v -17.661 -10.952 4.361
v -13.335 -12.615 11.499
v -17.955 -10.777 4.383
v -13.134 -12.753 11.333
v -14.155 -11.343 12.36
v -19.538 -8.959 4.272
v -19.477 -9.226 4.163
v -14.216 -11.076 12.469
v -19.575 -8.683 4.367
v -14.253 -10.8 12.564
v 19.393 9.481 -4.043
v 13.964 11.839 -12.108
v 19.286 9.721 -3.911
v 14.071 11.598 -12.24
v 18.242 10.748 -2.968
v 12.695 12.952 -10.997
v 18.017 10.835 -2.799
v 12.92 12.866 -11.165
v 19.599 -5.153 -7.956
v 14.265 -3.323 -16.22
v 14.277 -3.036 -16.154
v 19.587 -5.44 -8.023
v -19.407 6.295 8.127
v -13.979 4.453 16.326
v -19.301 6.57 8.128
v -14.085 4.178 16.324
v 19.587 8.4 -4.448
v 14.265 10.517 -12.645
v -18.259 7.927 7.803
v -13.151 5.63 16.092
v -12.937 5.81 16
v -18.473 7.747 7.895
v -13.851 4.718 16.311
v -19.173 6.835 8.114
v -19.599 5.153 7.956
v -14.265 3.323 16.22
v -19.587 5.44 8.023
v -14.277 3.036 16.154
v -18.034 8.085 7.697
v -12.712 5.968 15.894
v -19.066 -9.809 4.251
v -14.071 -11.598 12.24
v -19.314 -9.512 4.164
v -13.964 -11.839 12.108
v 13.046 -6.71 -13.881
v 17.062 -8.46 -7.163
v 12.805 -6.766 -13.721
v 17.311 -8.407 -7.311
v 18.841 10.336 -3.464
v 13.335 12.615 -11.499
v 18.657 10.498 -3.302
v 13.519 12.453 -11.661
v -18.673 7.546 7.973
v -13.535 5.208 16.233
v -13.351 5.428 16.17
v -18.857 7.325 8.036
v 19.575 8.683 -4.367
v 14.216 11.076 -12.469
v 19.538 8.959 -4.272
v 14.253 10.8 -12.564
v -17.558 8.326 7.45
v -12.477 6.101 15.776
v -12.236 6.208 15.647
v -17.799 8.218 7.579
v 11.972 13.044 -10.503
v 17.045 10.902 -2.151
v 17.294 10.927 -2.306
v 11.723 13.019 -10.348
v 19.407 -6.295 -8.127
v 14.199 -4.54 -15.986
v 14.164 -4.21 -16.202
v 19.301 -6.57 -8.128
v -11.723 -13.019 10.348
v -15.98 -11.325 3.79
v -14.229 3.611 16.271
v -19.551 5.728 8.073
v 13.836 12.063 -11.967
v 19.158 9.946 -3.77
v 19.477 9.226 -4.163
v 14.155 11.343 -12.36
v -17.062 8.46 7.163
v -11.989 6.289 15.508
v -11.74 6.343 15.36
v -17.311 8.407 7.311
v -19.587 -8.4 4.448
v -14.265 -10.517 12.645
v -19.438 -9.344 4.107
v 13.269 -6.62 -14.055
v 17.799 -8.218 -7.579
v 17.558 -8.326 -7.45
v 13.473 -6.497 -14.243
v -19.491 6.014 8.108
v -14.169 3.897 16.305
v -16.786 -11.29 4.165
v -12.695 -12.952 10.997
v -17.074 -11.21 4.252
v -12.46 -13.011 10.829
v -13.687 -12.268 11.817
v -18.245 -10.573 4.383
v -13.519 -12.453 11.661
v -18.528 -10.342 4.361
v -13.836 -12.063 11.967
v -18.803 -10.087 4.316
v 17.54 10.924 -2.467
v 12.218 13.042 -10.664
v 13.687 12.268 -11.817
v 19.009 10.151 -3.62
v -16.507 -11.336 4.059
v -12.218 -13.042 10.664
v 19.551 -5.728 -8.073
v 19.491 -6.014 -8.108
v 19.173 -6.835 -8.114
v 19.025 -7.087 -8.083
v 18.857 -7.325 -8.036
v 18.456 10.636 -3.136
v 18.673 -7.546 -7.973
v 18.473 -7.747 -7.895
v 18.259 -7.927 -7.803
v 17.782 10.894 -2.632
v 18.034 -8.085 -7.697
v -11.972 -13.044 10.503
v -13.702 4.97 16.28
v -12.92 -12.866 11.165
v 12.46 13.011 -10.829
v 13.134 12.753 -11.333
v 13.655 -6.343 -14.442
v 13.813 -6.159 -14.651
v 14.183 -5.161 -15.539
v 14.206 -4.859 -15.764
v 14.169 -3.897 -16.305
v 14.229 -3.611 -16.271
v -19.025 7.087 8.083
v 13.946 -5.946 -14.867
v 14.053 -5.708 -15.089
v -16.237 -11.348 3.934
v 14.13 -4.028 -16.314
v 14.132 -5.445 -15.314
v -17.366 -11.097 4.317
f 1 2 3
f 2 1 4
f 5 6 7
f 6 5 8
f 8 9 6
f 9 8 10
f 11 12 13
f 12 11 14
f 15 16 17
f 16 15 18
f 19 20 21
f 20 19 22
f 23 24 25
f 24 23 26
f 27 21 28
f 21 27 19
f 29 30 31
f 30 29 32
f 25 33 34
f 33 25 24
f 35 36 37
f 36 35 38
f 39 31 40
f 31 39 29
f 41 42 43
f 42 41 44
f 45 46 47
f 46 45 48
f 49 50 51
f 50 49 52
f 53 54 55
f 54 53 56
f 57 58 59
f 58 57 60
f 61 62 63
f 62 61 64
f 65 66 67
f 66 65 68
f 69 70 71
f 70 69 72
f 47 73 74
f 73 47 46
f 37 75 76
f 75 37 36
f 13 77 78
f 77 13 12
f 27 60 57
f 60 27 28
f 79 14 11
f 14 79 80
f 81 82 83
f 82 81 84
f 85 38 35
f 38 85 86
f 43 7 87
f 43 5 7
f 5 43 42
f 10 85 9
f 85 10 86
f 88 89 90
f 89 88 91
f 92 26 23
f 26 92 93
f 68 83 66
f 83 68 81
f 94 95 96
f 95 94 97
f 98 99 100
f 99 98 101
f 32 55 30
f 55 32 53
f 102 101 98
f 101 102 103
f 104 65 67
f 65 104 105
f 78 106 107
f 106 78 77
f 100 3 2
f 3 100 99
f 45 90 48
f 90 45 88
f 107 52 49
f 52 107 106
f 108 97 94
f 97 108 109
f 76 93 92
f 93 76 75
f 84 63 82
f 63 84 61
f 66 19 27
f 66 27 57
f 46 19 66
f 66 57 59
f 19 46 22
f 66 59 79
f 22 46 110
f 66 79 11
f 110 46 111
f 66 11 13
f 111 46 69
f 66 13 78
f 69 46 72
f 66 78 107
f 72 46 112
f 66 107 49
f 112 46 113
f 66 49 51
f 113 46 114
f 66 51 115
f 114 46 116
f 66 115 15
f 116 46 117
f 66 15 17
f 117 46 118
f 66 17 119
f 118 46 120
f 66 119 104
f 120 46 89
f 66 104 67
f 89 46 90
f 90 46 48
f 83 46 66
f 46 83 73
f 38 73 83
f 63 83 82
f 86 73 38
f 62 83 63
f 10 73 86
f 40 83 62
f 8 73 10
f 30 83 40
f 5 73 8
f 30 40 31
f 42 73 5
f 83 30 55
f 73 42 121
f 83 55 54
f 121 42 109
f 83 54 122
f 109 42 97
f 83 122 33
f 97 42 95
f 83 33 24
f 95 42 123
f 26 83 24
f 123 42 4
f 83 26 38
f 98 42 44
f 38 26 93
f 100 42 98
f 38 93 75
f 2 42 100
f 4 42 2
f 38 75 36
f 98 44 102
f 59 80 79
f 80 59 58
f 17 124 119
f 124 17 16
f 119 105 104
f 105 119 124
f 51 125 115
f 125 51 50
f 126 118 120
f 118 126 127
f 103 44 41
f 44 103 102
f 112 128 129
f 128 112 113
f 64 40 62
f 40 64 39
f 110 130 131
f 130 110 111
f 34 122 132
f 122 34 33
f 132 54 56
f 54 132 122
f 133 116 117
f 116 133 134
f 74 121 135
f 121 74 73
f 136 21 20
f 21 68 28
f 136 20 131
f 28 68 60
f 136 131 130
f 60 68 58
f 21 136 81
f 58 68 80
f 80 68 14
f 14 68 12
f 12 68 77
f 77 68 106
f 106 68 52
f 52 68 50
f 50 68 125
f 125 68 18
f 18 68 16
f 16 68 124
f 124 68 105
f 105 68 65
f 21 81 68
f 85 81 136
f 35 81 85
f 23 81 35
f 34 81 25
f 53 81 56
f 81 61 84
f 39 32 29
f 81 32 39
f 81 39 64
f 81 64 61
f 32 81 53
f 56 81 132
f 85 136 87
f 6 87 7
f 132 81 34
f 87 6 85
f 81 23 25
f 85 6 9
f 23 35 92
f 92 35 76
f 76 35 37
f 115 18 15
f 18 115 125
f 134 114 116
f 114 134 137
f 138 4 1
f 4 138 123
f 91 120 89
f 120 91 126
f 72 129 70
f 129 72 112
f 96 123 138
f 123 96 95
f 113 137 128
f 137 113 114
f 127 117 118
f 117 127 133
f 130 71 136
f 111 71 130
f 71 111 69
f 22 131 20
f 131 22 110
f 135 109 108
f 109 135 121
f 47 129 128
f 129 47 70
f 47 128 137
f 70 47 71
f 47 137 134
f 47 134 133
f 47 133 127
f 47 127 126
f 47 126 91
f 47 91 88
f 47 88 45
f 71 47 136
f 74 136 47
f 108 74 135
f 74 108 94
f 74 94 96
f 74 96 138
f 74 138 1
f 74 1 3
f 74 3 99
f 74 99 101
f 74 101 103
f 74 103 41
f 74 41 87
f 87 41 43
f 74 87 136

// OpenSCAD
// file: clipped_arc_plate.scad
// The bottom-front cutter crosses both front XY corner arcs.
$fn = 64;
body_length = 40;
body_width = 20;
body_height = 10;
corner_1_radius = 3;
corner_2_radius = 3;
corner_3_radius = 3;
corner_4_radius = 3;
chamfer_1_width = 2;

module clipped_arc_plate(body_length=40, body_width=20, body_height=10,
                          corner_1_radius=3, corner_2_radius=3,
                          corner_3_radius=3, corner_4_radius=3, chamfer_1_width=2) {
    r1=corner_1_radius; r2=corner_2_radius;
    r3=corner_3_radius; r4=corner_4_radius;
    assert(min(body_length,body_width,body_height,r1,r2,r3,r4,chamfer_1_width)>0);
    assert(2*max(r1,r2,r3,r4)<min(body_length,body_width));
    assert(chamfer_1_width<min(body_width,body_height));
    difference() {
        linear_extrude(height=body_height) hull() {
            translate([r1,r1]) circle(r=r1);
            translate([body_length-r2,r2]) circle(r=r2);
            translate([body_length-r3,body_width-r3]) circle(r=r3);
            translate([r4,body_width-r4]) circle(r=r4);
        }
        multmatrix([[0,0,1,-1],[1,0,0,0],[0,1,0,0],[0,0,0,1]])
            linear_extrude(height=body_length+2)
                polygon([[0,0],[chamfer_1_width,0],[0,chamfer_1_width]]);
    }
}

clipped_arc_plate(body_length,body_width,body_height,corner_1_radius,
    corner_2_radius,corner_3_radius,corner_4_radius,chamfer_1_width);
// main file
use <clipped_arc_plate.scad>
$fn = 64;
body_length = 40;
body_width = 20;
body_height = 10;
corner_1_radius = 3;
corner_2_radius = 3;
corner_3_radius = 3;
corner_4_radius = 3;
chamfer_1_width = 2;

rotate([17,31,9]) translate([-body_length/2,-body_width/2,-body_height/2])
    clipped_arc_plate(body_length,body_width,body_height,corner_1_radius,
        corner_2_radius,corner_3_radius,corner_4_radius,chamfer_1_width);
